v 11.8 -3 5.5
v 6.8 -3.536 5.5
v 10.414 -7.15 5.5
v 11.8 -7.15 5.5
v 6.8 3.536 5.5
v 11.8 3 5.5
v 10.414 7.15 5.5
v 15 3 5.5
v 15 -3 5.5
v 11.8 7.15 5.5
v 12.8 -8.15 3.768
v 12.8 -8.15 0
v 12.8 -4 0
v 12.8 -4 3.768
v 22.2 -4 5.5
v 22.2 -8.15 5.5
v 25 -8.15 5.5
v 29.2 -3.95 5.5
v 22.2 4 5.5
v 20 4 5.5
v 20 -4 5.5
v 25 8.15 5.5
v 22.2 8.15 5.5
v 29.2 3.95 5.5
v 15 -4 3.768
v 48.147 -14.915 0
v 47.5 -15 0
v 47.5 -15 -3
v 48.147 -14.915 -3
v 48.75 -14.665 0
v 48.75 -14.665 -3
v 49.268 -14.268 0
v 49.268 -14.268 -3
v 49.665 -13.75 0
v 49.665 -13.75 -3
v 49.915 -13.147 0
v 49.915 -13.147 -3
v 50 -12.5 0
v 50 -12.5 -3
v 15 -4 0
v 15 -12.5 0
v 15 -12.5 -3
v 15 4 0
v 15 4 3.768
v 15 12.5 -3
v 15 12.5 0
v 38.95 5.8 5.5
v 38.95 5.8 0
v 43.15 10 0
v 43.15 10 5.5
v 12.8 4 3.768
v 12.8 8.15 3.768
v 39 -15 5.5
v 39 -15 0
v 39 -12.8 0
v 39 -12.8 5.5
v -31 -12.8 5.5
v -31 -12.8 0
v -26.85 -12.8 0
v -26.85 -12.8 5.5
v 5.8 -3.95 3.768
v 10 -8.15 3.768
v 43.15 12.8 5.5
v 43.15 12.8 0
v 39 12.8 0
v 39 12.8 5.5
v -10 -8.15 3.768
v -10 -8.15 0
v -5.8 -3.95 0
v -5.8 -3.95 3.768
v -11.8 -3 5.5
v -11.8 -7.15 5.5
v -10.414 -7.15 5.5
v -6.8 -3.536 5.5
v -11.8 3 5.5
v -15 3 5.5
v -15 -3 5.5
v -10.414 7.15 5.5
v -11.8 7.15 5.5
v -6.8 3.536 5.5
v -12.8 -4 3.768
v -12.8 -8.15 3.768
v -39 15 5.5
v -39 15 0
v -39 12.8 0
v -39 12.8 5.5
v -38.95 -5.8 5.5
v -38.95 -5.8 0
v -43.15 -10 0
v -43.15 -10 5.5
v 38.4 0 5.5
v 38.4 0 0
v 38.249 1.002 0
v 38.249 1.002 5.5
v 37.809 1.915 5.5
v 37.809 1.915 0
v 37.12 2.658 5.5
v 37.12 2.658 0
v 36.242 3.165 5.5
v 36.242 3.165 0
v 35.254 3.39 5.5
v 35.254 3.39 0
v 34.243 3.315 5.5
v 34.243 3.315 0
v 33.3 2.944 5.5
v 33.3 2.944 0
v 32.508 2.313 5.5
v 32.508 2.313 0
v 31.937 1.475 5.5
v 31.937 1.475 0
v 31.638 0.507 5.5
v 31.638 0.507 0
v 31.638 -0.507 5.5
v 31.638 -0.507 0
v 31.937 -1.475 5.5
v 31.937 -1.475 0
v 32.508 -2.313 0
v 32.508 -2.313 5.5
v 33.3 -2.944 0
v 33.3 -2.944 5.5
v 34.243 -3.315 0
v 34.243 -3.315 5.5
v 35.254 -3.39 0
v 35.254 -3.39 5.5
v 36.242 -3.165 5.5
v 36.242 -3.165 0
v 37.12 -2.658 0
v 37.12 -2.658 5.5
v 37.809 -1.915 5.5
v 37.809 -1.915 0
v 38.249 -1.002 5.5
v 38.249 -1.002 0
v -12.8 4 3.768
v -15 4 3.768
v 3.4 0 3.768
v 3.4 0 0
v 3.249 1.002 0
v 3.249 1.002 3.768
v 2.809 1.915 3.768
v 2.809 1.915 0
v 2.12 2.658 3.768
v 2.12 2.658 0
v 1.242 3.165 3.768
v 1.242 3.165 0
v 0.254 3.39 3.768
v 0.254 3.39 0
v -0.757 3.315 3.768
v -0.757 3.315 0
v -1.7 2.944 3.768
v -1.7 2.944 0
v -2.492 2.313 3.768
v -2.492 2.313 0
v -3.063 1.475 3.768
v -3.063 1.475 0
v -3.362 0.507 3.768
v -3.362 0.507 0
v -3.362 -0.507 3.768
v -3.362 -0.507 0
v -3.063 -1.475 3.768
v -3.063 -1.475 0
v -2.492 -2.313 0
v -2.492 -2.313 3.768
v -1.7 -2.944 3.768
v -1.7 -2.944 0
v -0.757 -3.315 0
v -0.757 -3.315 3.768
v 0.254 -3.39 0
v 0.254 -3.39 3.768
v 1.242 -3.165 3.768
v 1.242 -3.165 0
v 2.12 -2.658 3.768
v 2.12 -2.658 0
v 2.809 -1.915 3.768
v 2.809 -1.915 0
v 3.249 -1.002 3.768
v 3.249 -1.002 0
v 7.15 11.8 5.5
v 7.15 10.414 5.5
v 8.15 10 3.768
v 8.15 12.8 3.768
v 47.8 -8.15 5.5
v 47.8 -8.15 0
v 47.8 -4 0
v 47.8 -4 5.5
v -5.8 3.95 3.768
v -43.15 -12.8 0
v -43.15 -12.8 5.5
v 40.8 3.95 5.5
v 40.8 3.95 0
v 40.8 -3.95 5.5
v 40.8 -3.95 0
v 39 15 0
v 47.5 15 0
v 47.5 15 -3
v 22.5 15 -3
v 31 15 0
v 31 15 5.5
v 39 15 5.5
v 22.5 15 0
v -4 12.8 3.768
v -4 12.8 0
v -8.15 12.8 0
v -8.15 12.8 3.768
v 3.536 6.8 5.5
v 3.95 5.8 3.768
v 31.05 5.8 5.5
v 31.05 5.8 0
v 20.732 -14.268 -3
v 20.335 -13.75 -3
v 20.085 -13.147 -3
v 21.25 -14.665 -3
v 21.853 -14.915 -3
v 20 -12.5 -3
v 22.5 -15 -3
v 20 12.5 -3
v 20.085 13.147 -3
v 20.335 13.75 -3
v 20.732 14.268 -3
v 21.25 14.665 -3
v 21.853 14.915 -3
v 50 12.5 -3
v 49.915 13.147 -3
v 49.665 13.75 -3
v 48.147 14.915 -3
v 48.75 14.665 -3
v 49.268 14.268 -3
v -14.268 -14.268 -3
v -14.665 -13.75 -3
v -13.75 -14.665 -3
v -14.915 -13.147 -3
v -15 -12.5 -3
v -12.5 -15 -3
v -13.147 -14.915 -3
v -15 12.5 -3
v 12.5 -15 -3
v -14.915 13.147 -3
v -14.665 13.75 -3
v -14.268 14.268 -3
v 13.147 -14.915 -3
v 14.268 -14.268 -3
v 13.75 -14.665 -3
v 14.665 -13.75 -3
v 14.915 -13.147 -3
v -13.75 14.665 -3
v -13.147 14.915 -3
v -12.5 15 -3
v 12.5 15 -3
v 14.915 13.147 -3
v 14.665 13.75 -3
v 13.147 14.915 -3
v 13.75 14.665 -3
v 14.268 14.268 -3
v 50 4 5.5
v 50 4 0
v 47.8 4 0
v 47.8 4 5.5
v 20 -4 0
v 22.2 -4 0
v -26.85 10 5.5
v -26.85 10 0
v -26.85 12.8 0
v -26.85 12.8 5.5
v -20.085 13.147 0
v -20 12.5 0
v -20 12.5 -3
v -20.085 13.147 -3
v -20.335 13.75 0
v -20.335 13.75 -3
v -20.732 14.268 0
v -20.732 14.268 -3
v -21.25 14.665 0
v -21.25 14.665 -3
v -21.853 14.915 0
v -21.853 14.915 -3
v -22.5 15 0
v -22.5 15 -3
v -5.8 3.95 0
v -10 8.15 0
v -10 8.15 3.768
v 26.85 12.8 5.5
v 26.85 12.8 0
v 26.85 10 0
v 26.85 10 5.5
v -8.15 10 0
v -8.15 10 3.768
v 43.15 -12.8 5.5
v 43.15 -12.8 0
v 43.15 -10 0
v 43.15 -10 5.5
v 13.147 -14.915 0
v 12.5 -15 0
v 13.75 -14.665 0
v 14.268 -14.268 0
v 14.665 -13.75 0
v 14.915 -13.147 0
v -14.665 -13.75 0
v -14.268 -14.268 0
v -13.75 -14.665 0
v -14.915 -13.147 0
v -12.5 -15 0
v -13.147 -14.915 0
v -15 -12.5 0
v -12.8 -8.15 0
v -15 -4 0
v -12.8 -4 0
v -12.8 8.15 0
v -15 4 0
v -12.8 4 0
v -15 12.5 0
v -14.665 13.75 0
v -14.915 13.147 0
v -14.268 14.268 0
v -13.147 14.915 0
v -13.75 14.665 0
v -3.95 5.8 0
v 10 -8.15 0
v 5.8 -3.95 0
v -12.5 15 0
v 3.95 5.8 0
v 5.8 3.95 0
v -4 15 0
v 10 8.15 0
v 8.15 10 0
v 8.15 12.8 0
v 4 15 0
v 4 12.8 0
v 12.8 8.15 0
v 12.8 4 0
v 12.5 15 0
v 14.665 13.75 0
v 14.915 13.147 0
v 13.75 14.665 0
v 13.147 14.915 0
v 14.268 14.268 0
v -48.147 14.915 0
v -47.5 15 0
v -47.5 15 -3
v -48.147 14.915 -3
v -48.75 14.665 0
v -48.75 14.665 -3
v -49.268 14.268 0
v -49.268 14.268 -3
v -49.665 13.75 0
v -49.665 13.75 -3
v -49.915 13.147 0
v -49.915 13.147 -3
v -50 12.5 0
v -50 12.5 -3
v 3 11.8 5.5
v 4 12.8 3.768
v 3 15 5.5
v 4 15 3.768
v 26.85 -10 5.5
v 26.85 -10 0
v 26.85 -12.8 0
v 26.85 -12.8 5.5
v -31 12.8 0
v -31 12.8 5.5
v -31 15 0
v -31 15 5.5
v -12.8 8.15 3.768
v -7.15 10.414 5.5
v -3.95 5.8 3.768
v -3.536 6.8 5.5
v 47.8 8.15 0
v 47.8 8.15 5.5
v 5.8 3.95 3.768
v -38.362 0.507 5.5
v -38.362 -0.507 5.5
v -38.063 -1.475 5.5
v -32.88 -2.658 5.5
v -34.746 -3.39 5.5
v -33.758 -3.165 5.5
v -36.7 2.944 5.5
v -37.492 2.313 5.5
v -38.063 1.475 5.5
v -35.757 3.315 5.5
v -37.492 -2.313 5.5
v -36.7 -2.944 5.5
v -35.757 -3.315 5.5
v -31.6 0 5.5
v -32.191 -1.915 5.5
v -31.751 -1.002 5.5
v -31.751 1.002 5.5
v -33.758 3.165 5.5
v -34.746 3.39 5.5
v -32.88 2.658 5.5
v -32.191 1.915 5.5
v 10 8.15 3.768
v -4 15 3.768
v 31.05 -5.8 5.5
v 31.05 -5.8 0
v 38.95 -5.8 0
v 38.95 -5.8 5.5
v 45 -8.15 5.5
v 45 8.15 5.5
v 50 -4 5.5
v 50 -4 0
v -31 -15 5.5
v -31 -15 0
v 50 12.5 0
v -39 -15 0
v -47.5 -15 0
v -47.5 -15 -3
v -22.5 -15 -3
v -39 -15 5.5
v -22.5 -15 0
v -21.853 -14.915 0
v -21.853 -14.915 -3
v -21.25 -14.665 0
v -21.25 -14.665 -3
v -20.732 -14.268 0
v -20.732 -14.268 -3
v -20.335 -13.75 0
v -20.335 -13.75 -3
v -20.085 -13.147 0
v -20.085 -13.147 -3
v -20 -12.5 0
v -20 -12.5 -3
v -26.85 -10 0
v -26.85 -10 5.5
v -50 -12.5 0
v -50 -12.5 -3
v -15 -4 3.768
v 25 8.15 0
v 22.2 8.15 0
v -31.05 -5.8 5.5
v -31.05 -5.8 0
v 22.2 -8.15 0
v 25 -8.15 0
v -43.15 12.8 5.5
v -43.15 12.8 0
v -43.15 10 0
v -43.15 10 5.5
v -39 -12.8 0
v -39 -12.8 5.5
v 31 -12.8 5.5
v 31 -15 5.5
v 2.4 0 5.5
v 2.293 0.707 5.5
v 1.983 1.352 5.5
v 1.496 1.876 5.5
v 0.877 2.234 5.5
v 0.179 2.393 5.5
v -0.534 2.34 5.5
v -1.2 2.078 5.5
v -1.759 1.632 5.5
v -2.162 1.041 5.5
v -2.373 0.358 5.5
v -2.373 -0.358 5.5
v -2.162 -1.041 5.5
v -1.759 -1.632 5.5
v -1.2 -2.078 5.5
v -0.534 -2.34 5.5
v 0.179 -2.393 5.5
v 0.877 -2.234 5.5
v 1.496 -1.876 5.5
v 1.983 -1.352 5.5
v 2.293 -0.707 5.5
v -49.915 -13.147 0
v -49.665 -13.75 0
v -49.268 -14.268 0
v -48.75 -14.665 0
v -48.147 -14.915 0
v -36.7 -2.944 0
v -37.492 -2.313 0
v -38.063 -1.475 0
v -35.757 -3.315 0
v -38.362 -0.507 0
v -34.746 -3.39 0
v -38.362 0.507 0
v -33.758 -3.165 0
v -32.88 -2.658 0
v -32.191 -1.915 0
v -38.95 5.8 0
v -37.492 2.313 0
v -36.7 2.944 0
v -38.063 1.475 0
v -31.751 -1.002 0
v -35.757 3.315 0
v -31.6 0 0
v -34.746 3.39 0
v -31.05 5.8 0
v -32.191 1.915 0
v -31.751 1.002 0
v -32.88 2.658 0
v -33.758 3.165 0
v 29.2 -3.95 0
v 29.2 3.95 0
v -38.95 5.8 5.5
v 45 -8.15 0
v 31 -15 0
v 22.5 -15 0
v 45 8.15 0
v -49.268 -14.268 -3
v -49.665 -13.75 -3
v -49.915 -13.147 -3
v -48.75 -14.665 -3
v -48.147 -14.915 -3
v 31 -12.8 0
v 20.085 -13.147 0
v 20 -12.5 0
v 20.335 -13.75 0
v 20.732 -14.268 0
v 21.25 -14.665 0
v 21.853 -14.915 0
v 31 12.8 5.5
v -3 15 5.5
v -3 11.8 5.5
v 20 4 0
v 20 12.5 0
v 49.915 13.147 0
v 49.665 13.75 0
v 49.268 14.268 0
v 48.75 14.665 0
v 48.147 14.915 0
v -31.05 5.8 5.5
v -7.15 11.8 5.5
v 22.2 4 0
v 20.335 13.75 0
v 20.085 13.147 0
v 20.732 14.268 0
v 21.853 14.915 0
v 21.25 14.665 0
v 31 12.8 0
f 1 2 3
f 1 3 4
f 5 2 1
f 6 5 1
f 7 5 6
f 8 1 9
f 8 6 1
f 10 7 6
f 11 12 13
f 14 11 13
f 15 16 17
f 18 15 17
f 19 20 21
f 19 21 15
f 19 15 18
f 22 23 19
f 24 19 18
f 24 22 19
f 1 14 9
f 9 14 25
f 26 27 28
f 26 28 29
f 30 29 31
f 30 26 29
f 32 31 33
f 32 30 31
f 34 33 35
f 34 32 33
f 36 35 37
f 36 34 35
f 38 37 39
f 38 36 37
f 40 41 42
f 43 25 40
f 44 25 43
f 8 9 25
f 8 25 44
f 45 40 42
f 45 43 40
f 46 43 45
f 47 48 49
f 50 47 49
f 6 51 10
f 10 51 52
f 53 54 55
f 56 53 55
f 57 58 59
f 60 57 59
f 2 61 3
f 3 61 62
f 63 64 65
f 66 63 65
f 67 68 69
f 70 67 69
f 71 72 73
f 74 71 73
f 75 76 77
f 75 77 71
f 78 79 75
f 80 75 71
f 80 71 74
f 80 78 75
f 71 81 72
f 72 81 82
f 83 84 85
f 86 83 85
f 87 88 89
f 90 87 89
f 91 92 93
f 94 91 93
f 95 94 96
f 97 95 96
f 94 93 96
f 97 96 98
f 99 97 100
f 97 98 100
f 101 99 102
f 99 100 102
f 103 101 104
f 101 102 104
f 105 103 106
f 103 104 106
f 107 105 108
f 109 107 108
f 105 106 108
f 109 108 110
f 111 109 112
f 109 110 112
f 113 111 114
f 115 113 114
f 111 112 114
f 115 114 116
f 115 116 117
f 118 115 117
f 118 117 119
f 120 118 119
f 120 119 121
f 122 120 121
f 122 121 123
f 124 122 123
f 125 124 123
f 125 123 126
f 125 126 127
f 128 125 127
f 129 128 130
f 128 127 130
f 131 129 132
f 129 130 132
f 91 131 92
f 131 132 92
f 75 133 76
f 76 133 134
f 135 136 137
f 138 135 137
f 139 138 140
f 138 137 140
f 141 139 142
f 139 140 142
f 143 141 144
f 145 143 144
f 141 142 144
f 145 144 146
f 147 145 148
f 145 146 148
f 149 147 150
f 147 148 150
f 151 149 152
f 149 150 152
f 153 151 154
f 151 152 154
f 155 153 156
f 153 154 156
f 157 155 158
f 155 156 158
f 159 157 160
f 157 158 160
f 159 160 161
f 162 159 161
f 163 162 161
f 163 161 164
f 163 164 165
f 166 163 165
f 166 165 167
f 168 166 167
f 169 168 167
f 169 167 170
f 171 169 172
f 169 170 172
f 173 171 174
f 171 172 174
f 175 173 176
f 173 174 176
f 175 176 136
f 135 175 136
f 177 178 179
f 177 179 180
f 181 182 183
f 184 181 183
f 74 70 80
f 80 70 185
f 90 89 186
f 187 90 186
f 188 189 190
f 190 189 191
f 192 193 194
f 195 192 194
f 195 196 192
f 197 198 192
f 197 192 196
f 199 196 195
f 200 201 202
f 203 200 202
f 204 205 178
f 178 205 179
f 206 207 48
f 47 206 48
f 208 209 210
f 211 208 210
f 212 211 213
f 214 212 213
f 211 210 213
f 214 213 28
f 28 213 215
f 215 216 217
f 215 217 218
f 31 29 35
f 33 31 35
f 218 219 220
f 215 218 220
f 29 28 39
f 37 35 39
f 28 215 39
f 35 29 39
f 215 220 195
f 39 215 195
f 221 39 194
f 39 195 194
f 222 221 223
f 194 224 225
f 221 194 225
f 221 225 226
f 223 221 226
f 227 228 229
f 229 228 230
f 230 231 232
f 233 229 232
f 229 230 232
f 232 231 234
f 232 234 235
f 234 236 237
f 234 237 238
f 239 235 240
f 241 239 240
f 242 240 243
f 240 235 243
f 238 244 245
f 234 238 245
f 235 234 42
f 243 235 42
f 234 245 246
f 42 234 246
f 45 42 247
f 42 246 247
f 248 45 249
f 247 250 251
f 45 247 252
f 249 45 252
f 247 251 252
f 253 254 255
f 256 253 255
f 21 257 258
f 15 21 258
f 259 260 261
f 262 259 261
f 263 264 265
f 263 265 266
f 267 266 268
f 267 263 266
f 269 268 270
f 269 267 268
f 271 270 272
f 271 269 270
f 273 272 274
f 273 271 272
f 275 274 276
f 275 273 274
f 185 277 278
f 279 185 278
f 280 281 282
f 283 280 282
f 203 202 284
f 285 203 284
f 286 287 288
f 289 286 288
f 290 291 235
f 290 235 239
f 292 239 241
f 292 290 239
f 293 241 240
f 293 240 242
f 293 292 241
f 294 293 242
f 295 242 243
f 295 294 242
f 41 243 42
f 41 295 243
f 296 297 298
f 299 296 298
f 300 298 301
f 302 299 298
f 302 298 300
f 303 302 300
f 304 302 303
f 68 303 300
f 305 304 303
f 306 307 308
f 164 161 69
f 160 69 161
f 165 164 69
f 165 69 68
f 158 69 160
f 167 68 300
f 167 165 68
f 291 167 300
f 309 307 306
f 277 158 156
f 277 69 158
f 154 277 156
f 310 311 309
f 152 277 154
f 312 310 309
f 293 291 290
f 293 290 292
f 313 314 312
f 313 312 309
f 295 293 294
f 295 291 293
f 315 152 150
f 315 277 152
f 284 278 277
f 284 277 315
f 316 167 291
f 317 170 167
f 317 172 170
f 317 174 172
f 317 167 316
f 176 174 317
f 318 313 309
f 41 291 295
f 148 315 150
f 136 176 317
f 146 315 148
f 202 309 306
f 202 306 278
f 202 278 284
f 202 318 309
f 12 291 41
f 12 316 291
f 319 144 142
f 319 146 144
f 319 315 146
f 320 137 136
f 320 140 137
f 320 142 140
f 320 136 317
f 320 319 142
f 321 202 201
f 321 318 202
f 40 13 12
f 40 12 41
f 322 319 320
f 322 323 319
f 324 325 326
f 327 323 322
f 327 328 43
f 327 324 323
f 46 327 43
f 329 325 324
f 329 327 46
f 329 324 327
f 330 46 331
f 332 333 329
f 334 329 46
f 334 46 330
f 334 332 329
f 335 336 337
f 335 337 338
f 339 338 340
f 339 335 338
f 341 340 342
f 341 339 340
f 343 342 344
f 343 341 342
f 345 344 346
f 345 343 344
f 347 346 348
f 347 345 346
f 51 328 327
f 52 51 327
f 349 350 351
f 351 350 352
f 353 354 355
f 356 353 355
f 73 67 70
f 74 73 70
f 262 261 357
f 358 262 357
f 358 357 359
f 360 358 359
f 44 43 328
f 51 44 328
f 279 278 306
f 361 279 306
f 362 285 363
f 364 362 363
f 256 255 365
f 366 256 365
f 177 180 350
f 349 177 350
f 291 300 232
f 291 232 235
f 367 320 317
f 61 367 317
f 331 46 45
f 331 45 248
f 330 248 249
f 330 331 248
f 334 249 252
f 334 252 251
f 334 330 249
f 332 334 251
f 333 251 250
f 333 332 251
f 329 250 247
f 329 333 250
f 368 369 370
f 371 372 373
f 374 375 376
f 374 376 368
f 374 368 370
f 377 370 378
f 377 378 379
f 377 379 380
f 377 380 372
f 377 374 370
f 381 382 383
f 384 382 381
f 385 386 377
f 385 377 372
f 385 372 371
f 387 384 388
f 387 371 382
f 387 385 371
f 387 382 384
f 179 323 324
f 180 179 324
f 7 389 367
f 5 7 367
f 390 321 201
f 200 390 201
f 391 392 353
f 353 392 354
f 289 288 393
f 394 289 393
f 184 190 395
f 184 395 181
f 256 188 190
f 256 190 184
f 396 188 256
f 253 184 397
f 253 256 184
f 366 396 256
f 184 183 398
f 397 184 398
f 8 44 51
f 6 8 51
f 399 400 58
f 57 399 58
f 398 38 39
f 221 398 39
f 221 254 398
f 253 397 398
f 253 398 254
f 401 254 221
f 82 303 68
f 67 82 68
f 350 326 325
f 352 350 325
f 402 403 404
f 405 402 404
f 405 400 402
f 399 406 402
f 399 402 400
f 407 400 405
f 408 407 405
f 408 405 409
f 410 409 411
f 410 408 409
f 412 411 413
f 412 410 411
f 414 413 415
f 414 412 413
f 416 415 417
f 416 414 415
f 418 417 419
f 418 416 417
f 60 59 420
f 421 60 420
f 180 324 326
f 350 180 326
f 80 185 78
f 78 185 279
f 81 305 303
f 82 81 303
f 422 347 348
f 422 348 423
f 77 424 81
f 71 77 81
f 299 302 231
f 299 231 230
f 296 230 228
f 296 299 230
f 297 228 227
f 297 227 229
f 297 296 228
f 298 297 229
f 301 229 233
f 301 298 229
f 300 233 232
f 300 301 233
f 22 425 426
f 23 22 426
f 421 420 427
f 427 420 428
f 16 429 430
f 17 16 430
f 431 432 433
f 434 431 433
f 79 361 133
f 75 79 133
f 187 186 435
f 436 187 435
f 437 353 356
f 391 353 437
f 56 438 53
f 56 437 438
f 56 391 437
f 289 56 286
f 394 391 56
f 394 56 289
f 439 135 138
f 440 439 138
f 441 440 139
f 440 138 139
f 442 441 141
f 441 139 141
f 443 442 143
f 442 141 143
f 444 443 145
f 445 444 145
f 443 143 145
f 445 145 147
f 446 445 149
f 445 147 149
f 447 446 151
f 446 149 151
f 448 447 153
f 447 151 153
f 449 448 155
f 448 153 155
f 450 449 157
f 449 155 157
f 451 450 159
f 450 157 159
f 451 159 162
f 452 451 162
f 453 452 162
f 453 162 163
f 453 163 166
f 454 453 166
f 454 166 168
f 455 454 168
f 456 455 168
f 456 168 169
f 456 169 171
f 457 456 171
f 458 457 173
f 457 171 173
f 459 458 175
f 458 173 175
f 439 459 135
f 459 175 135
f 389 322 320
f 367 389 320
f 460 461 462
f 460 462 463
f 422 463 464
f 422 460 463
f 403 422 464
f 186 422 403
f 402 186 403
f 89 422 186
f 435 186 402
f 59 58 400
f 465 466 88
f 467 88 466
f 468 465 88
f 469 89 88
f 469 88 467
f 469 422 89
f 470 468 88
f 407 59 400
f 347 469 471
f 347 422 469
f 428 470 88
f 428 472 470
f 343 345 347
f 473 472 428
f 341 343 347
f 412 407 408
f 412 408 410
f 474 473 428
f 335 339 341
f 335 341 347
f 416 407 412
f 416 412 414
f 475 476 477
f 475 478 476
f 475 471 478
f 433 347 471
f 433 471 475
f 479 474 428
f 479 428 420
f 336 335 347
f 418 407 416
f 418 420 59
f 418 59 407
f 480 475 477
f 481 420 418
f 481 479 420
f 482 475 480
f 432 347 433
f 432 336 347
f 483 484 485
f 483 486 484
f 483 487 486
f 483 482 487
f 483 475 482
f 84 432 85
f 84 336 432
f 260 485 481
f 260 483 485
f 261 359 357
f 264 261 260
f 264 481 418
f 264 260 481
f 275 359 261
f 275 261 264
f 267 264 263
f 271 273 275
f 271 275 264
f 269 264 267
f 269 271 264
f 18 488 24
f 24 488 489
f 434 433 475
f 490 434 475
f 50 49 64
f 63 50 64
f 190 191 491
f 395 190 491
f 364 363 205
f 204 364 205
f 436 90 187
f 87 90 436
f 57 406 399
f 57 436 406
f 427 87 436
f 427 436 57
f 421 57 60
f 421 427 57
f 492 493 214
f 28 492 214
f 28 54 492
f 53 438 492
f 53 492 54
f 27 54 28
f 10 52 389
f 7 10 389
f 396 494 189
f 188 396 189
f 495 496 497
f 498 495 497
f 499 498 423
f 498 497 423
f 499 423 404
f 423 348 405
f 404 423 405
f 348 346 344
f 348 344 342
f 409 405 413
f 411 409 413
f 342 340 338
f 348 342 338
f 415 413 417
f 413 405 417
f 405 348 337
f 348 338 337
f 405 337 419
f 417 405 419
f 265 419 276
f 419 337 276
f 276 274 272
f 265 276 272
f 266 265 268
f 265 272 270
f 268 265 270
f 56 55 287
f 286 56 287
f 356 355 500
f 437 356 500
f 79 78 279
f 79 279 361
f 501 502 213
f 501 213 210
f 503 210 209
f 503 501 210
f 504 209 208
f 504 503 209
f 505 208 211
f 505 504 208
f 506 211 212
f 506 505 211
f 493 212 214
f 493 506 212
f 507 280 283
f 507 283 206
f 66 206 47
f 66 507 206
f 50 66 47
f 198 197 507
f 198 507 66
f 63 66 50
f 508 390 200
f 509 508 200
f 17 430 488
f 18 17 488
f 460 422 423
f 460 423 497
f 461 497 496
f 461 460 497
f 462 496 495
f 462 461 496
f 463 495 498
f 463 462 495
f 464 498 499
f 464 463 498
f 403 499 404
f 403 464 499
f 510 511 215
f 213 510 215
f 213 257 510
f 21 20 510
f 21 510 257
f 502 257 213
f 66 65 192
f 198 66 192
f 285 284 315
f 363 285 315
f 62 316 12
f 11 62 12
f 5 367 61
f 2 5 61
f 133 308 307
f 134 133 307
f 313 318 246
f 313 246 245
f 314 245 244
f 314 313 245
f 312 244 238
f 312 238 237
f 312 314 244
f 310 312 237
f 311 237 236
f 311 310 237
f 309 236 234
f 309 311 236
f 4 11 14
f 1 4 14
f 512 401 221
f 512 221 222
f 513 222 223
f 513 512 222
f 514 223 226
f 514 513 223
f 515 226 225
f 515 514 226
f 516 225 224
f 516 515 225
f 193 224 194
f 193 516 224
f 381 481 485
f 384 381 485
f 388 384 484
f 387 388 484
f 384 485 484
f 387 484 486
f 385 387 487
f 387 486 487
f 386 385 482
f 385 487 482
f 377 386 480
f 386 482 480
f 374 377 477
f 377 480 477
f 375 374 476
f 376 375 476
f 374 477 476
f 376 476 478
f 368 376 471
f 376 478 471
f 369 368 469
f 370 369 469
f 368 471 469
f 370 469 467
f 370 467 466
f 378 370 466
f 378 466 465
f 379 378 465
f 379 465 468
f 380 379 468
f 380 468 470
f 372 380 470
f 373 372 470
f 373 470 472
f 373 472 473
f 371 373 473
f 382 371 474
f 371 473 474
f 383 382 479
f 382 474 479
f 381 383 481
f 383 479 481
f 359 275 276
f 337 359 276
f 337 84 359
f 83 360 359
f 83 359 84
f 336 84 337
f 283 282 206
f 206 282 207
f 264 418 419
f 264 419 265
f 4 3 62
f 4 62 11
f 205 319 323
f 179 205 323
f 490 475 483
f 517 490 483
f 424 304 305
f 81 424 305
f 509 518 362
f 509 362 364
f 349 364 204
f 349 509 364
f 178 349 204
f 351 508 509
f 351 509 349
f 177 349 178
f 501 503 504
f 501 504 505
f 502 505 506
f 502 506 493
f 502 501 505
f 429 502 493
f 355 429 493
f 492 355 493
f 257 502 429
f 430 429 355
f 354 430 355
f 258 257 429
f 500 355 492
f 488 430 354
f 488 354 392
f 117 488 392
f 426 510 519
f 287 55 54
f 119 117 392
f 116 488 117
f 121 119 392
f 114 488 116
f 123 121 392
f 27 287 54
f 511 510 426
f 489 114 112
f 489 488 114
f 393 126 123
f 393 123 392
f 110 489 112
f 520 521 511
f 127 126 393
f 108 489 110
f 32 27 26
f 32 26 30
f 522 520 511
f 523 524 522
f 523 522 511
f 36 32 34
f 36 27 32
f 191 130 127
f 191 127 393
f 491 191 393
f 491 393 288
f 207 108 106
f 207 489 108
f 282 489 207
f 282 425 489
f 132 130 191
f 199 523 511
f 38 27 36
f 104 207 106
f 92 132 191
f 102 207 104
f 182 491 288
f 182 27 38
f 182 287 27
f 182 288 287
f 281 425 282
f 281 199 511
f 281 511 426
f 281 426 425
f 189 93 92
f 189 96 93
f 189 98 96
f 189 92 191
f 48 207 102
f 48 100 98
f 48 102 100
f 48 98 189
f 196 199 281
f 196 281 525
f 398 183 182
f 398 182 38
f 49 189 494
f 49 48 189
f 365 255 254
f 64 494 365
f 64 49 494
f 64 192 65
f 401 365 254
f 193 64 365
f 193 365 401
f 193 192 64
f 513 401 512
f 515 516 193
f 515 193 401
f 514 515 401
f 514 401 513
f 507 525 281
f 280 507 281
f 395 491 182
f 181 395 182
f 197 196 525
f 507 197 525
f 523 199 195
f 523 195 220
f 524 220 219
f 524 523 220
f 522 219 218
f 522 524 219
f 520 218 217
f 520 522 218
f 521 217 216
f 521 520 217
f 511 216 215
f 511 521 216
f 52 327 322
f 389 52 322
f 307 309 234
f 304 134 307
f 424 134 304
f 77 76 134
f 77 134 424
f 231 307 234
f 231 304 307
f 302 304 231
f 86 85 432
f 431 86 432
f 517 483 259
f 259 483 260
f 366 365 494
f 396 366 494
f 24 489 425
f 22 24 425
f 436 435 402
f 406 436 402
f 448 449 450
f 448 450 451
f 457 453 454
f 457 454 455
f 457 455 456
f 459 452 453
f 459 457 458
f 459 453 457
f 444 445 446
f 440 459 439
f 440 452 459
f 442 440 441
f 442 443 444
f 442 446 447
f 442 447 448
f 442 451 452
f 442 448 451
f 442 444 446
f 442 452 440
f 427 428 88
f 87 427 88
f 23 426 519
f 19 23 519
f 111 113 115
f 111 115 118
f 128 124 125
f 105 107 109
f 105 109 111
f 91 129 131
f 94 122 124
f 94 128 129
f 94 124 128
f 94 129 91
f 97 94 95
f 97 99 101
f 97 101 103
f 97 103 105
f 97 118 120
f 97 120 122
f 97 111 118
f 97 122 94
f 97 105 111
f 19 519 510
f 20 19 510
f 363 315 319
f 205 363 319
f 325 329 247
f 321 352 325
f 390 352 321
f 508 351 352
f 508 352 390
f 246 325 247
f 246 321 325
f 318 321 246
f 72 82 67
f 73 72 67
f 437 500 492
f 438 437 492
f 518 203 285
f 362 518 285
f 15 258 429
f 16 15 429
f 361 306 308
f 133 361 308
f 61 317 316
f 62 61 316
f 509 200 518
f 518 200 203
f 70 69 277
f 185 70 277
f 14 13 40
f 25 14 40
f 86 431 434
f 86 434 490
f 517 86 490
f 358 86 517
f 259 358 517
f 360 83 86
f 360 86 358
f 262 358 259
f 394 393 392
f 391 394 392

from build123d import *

# Parameters (mm, degrees)
F0_R       = 3.4
F1_DEPTH   = 3
F2_DEPTH   = 5.5
F3_DEPTH   = 3
F4_DEPTH   = 5.5
F5_DEPTH   = 3
F6_DEPTH   = 5.5
F7_SIZE2   = 1.7320508076
F7_SIZE    = 1
F7_2_SIZE2 = 1.7320508076
F7_2_SIZE  = 1
F7_3_SIZE2 = 1.7320508076
F7_3_SIZE  = 1
F8_SIZE2   = 1.7320508076
F8_SIZE    = 1


with BuildPart() as f1:
    # F0 (on Top) → F1 (new body)
    with BuildSketch(Plane.XY):
        with BuildLine():
            Line((-4, 15), (-12.5, 15))
            ThreePointArc((-12.5, 15), (-14.267766953, 14.267766953), (-15, 12.5))
            Line((-15, 12.5), (-15, 4))
            Line((-15, 4), (-12.8, 4))
            Line((-12.8, 4), (-12.8, 8.15))
            Line((-12.8, 8.15), (-10, 8.15))
            Line((-10, 8.15), (-5.8, 3.95))
            Line((-5.8, 3.95), (-5.8, -3.95))
            Line((-5.8, -3.95), (-10, -8.15))
            Line((-10, -8.15), (-12.8, -8.15))
            Line((-12.8, -8.15), (-12.8, -4))
            Line((-12.8, -4), (-15, -4))
            Line((-15, -4), (-15, -12.5))
            ThreePointArc((-15, -12.5), (-14.267766953, -14.267766953), (-12.5, -15))
            Line((-12.5, -15), (-4, -15))
            Line((-4, -15), (-4, -12.8))
            Line((-4, -12.8), (-8.15, -12.8))
            Line((-8.15, -12.8), (-8.15, -10))
            Line((-8.15, -10), (-3.95, -5.8))
            Line((-3.95, -5.8), (3.95, -5.8))
            Line((3.95, -5.8), (8.15, -10))
            Line((8.15, -10), (8.15, -12.8))
            Line((8.15, -12.8), (4, -12.8))
            Line((4, -12.8), (4, -15))
            Line((4, -15), (12.5, -15))
            ThreePointArc((12.5, -15), (14.267766953, -14.267766953), (15, -12.5))
            Line((15, -12.5), (15, -4))
            Line((15, -4), (12.8, -4))
            Line((12.8, -4), (12.8, -8.15))
            Line((12.8, -8.15), (10, -8.15))
            Line((10, -8.15), (5.8, -3.95))
            Line((5.8, -3.95), (5.8, 3.95))
            Line((5.8, 3.95), (10, 8.15))
            Line((10, 8.15), (12.8, 8.15))
            Line((12.8, 8.15), (12.8, 4))
            Line((12.8, 4), (15, 4))
            Line((15, 4), (15, 12.5))
            ThreePointArc((15, 12.5), (14.267766953, 14.267766953), (12.5, 15))
            Line((12.5, 15), (4, 15))
            Line((4, 15), (4, 12.8))
            Line((4, 12.8), (8.15, 12.8))
            Line((8.15, 12.8), (8.15, 10))
            Line((8.15, 10), (3.95, 5.8))
            Line((3.95, 5.8), (-3.95, 5.8))
            Line((-3.95, 5.8), (-8.15, 10))
            Line((-8.15, 10), (-8.15, 12.8))
            Line((-8.15, 12.8), (-4, 12.8))
            Line((-4, 12.8), (-4, 15))
        make_face()
        Circle(F0_R, mode=Mode.SUBTRACT)
        Polygon((15, -4), (15, 4), (12.8, 4), (12.8, 8.15), (10, 8.15), (5.8, 3.95), (5.8, -3.95), (10, -8.15), (12.8, -8.15), (12.8, -4), align=None)
        Polygon((-12.8, 4), (-15, 4), (-15, -4), (-12.8, -4), (-12.8, -8.15), (-10, -8.15), (-5.8, -3.95), (-5.8, 3.95), (-10, 8.15), (-12.8, 8.15), align=None)
        Polygon((-4, -12.8), (-4, -15), (4, -15), (4, -12.8), (8.15, -12.8), (8.15, -10), (3.95, -5.8), (-3.95, -5.8), (-8.15, -10), (-8.15, -12.8), align=None)
        Polygon((4, 15), (-4, 15), (-4, 12.8), (-8.15, 12.8), (-8.15, 10), (-3.95, 5.8), (3.95, 5.8), (8.15, 10), (8.15, 12.8), (4, 12.8), align=None)
        Circle(F0_R)
    extrude(amount=-F1_DEPTH)

    # F0 (on Top) → F2 (join)
    with BuildSketch(Plane.XY):
        Polygon((-12.8, 4), (-15, 4), (-15, -4), (-12.8, -4), (-12.8, -8.15), (-10, -8.15), (-5.8, -3.95), (-5.8, 3.95), (-10, 8.15), (-12.8, 8.15), align=None)
        Polygon((4, 15), (-4, 15), (-4, 12.8), (-8.15, 12.8), (-8.15, 10), (-3.95, 5.8), (3.95, 5.8), (8.15, 10), (8.15, 12.8), (4, 12.8), align=None)
        Polygon((15, -4), (15, 4), (12.8, 4), (12.8, 8.15), (10, 8.15), (5.8, 3.95), (5.8, -3.95), (10, -8.15), (12.8, -8.15), (12.8, -4), align=None)
        Circle(F0_R)
    extrude(amount=F2_DEPTH)

    # F7
    f7_edges = [f1.edges().sort_by_distance(p)[0] for p in [
        (-7.9, -6.05, 5.5),
        (-5.8, 0, 5.5),
        (-7.9, 6.05, 5.5),
        (-11.4, 8.15, 5.5),
        (-12.8, 6.075, 5.5),
        (-13.9, 4, 5.5),
        (-13.9, -4, 5.5),
        (-12.8, -6.075, 5.5),
        (-11.4, -8.15, 5.5),
    ]]
    f7_side = f1.faces().sort_by_distance((-10.334578, 0, 5.5))[0]
    chamfer(f7_edges, length=F7_SIZE, length2=F7_SIZE2, reference=f7_side)

    # F7#2
    f7_2_edges = [f1.edges().sort_by_distance(p)[0] for p in [
        (-3.4, 0, 5.5),
    ]]
    f7_2_side = f1.faces().sort_by_distance((0, 0, 5.5))[0]
    chamfer(f7_2_edges, length=F7_2_SIZE, length2=F7_2_SIZE2, reference=f7_2_side)

    # F7#3
    f7_3_edges = [f1.edges().sort_by_distance(p)[0] for p in [
        (13.9, -4, 5.5),
        (12.8, -6.075, 5.5),
        (11.4, -8.15, 5.5),
        (7.9, -6.05, 5.5),
        (5.8, 0, 5.5),
        (7.9, 6.05, 5.5),
        (11.4, 8.15, 5.5),
        (12.8, 6.075, 5.5),
        (13.9, 4, 5.5),
    ]]
    f7_3_side = f1.faces().sort_by_distance((10.334578, 0, 5.5))[0]
    chamfer(f7_3_edges, length=F7_3_SIZE, length2=F7_3_SIZE2, reference=f7_3_side)

    # F8
    f8_edges = [f1.edges().sort_by_distance(p)[0] for p in [
        (-8.15, 11.4, 5.5),
        (-6.05, 7.9, 5.5),
        (0, 5.8, 5.5),
        (6.05, 7.9, 5.5),
        (8.15, 11.4, 5.5),
        (6.075, 12.8, 5.5),
        (-6.075, 12.8, 5.5),
        (-4, 13.9, 5.5),
        (4, 13.9, 5.5),
    ]]
    f8_side = f1.faces().sort_by_distance((0, 10.334578, 5.5))[0]
    chamfer(f8_edges, length=F8_SIZE, length2=F8_SIZE2, reference=f8_side)


with BuildPart() as f3:
    # F0 (on Top) → F3 (new body, through all)
    with BuildSketch(Plane.XY):
        with BuildLine():
            ThreePointArc((-20, 12.5), (-20.732233047, 14.267766953), (-22.5, 15))
            Line((-22.5, 15), (-31, 15))
            Line((-31, 15), (-31, 12.8))
            Line((-31, 12.8), (-26.85, 12.8))
            Line((-26.85, 12.8), (-26.85, 10))
            Line((-26.85, 10), (-31.05, 5.8))
            Line((-31.05, 5.8), (-38.95, 5.8))
            Line((-38.95, 5.8), (-43.15, 10))
            Line((-43.15, 10), (-43.15, 12.8))
            Line((-43.15, 12.8), (-39, 12.8))
            Line((-39, 12.8), (-39, 15))
            Line((-39, 15), (-47.5, 15))
            ThreePointArc((-47.5, 15), (-49.267766953, 14.267766953), (-50, 12.5))
            Line((-50, 12.5), (-50, 4))
            Line((-50, 4), (-47.8, 4))
            Line((-47.8, 4), (-47.8, 8.15))
            Line((-47.8, 8.15), (-45, 8.15))
            Line((-45, 8.15), (-40.8, 3.95))
            Line((-40.8, 3.95), (-40.8, -3.95))
            Line((-40.8, -3.95), (-45, -8.15))
            Line((-45, -8.15), (-47.8, -8.15))
            Line((-47.8, -8.15), (-47.8, -4))
            Line((-47.8, -4), (-50, -4))
            Line((-50, -4), (-50, -12.5))
            ThreePointArc((-50, -12.5), (-49.267766953, -14.267766953), (-47.5, -15))
            Line((-47.5, -15), (-39, -15))
            Line((-39, -15), (-39, -12.8))
            Line((-39, -12.8), (-43.15, -12.8))
            Line((-43.15, -12.8), (-43.15, -10))
            Line((-43.15, -10), (-38.95, -5.8))
            Line((-38.95, -5.8), (-31.05, -5.8))
            Line((-31.05, -5.8), (-26.85, -10))
            Line((-26.85, -10), (-26.85, -12.8))
            Line((-26.85, -12.8), (-31, -12.8))
            Line((-31, -12.8), (-31, -15))
            Line((-31, -15), (-22.5, -15))
            ThreePointArc((-22.5, -15), (-20.732233047, -14.267766953), (-20, -12.5))
            Line((-20, -12.5), (-20, -4))
            Line((-20, -4), (-22.2, -4))
            Line((-22.2, -4), (-22.2, -8.15))
            Line((-22.2, -8.15), (-25, -8.15))
            Line((-25, -8.15), (-29.2, -3.95))
            Line((-29.2, -3.95), (-29.2, 3.95))
            Line((-29.2, 3.95), (-25, 8.15))
            Line((-25, 8.15), (-22.2, 8.15))
            Line((-22.2, 8.15), (-22.2, 4))
            Line((-22.2, 4), (-20, 4))
            Line((-20, 4), (-20, 12.5))
        make_face()
        with Locations((-35, 0)):
            Circle(F0_R, mode=Mode.SUBTRACT)
        Polygon((-39, -15), (-31, -15), (-31, -12.8), (-26.85, -12.8), (-26.85, -10), (-31.05, -5.8), (-38.95, -5.8), (-43.15, -10), (-43.15, -12.8), (-39, -12.8), align=None)
        Polygon((-20, -4), (-20, 4), (-22.2, 4), (-22.2, 8.15), (-25, 8.15), (-29.2, 3.95), (-29.2, -3.95), (-25, -8.15), (-22.2, -8.15), (-22.2, -4), align=None)
        Polygon((-31, 12.8), (-31, 15), (-39, 15), (-39, 12.8), (-43.15, 12.8), (-43.15, 10), (-38.95, 5.8), (-31.05, 5.8), (-26.85, 10), (-26.85, 12.8), align=None)
        Polygon((-47.8, 4), (-50, 4), (-50, -4), (-47.8, -4), (-47.8, -8.15), (-45, -8.15), (-40.8, -3.95), (-40.8, 3.95), (-45, 8.15), (-47.8, 8.15), align=None)
        with Locations((-35, 0)):
            Circle(F0_R)
    extrude(amount=-F3_DEPTH)

    # F0 (on Top) → F4 (join, through all)
    with BuildSketch(Plane.XY):
        Polygon((-31, 12.8), (-31, 15), (-39, 15), (-39, 12.8), (-43.15, 12.8), (-43.15, 10), (-38.95, 5.8), (-31.05, 5.8), (-26.85, 10), (-26.85, 12.8), align=None)
        with Locations((-35, 0)):
            Circle(F0_R)
        Polygon((-39, -15), (-31, -15), (-31, -12.8), (-26.85, -12.8), (-26.85, -10), (-31.05, -5.8), (-38.95, -5.8), (-43.15, -10), (-43.15, -12.8), (-39, -12.8), align=None)
    extrude(amount=F4_DEPTH)


with BuildPart() as f5:
    # F0 (on Top) → F5 (new body, through all)
    with BuildSketch(Plane.XY):
        with BuildLine():
            ThreePointArc((47.5, -15), (49.267766953, -14.267766953), (50, -12.5))
            Line((50, -12.5), (50, -4))
            Line((50, -4), (47.8, -4))
            Line((47.8, -4), (47.8, -8.15))
            Line((47.8, -8.15), (45, -8.15))
            Line((45, -8.15), (40.8, -3.95))
            Line((40.8, -3.95), (40.8, 3.95))
            Line((40.8, 3.95), (45, 8.15))
            Line((45, 8.15), (47.8, 8.15))
            Line((47.8, 8.15), (47.8, 4))
            Line((47.8, 4), (50, 4))
            Line((50, 4), (50, 12.5))
            ThreePointArc((50, 12.5), (49.267766953, 14.267766953), (47.5, 15))
            Line((47.5, 15), (39, 15))
            Line((39, 15), (39, 12.8))
            Line((39, 12.8), (43.15, 12.8))
            Line((43.15, 12.8), (43.15, 10))
            Line((43.15, 10), (38.95, 5.8))
            Line((38.95, 5.8), (31.05, 5.8))
            Line((31.05, 5.8), (26.85, 10))
            Line((26.85, 10), (26.85, 12.8))
            Line((26.85, 12.8), (31, 12.8))
            Line((31, 12.8), (31, 15))
            Line((31, 15), (22.5, 15))
            ThreePointArc((22.5, 15), (20.732233047, 14.267766953), (20, 12.5))
            Line((20, 12.5), (20, 4))
            Line((20, 4), (22.2, 4))
            Line((22.2, 4), (22.2, 8.15))
            Line((22.2, 8.15), (25, 8.15))
            Line((25, 8.15), (29.2, 3.95))
            Line((29.2, 3.95), (29.2, -3.95))
            Line((29.2, -3.95), (25, -8.15))
            Line((25, -8.15), (22.2, -8.15))
            Line((22.2, -8.15), (22.2, -4))
            Line((22.2, -4), (20, -4))
            Line((20, -4), (20, -12.5))
            ThreePointArc((20, -12.5), (20.732233047, -14.267766953), (22.5, -15))
            Line((22.5, -15), (31, -15))
            Line((31, -15), (31, -12.8))
            Line((31, -12.8), (26.85, -12.8))
            Line((26.85, -12.8), (26.85, -10))
            Line((26.85, -10), (31.05, -5.8))
            Line((31.05, -5.8), (38.95, -5.8))
            Line((38.95, -5.8), (43.15, -10))
            Line((43.15, -10), (43.15, -12.8))
            Line((43.15, -12.8), (39, -12.8))
            Line((39, -12.8), (39, -15))
            Line((39, -15), (47.5, -15))
        make_face()
        with Locations((35, 0)):
            Circle(F0_R, mode=Mode.SUBTRACT)
        Polygon((39, 12.8), (39, 15), (31, 15), (31, 12.8), (26.85, 12.8), (26.85, 10), (31.05, 5.8), (38.95, 5.8), (43.15, 10), (43.15, 12.8), align=None)
        Polygon((20, 4), (20, -4), (22.2, -4), (22.2, -8.15), (25, -8.15), (29.2, -3.95), (29.2, 3.95), (25, 8.15), (22.2, 8.15), (22.2, 4), align=None)
        Polygon((31, -15), (39, -15), (39, -12.8), (43.15, -12.8), (43.15, -10), (38.95, -5.8), (31.05, -5.8), (26.85, -10), (26.85, -12.8), (31, -12.8), align=None)
        Polygon((47.8, -4), (50, -4), (50, 4), (47.8, 4), (47.8, 8.15), (45, 8.15), (40.8, 3.95), (40.8, -3.95), (45, -8.15), (47.8, -8.15), align=None)
        with Locations((35, 0)):
            Circle(F0_R)
    extrude(amount=-F5_DEPTH)

    # F0 (on Top) → F6 (join, through all)
    with BuildSketch(Plane.XY):
        Polygon((20, 4), (20, -4), (22.2, -4), (22.2, -8.15), (25, -8.15), (29.2, -3.95), (29.2, 3.95), (25, 8.15), (22.2, 8.15), (22.2, 4), align=None)
        Polygon((39, 12.8), (39, 15), (31, 15), (31, 12.8), (26.85, 12.8), (26.85, 10), (31.05, 5.8), (38.95, 5.8), (43.15, 10), (43.15, 12.8), align=None)
        Polygon((47.8, -4), (50, -4), (50, 4), (47.8, 4), (47.8, 8.15), (45, 8.15), (40.8, 3.95), (40.8, -3.95), (45, -8.15), (47.8, -8.15), align=None)
        Polygon((31, -15), (39, -15), (39, -12.8), (43.15, -12.8), (43.15, -10), (38.95, -5.8), (31.05, -5.8), (26.85, -10), (26.85, -12.8), (31, -12.8), align=None)
        with Locations((35, 0)):
            Circle(F0_R)
    extrude(amount=F6_DEPTH)


solid = Compound([f1.part, f3.part, f5.part])
